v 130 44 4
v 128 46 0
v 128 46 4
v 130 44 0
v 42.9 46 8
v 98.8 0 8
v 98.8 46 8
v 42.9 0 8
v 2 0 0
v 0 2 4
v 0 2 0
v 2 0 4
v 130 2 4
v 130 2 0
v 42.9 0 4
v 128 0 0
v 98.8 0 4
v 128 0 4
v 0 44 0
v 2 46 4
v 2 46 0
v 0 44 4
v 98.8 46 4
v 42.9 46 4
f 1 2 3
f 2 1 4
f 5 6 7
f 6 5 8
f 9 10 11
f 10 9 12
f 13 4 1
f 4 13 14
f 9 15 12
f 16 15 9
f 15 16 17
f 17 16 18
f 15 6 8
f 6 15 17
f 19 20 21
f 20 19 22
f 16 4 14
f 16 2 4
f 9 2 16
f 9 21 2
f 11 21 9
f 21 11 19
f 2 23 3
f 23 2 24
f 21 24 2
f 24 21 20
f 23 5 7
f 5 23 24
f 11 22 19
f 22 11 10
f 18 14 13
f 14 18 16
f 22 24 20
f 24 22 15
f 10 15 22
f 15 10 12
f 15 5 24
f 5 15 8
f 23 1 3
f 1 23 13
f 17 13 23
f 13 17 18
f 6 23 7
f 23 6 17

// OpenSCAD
$fn = 32;

// ----------------------------------------------------------------------
// Stepped bar: centerstep, 130 x 46 x 8/4 mm
// ----------------------------------------------------------------------

// --- parameters (mm) ---
bar_l = 130;              // bar length, X
bar_w = 46;               // bar width, Y
plate_t = 8;              // thickness of the thick zone, Z
thin_t = 4;               // thickness of the thin zone
corner_c = 2;             // corner chamfer of the bar
step_cut = 4;             // material removed from the thin zone
thick_from = 42.9;        // start of the thick middle zone
thick_to = 98.8;          // end of the thick middle zone
depth_1 = 4;              // depth of cut 1 from the top face
depth_2 = 4;              // depth of cut 2 from the top face
fit_tol = 0.1;            // declared fit tolerance (prompt contract)
free_tol = 0.3;           // declared free tolerance (prompt contract)

profile = [[2, 0], [128, 0], [130, 2], [130, 44], [128, 46], [2, 46], [0, 44], [0, 2]];  // primary outline, 8 points, counter clockwise
void_1 = [[-1, -1], [42.9, -1], [42.9, 47], [-1, 47]];  // thin left end, 4 points
void_2 = [[98.8, -1], [131, -1], [131, 47], [98.8, 47]];  // thin right end, 4 points

// --- the one profile operation ---
difference() {
  linear_extrude(height = plate_t) polygon(points = profile);
  translate([0, 0, plate_t - depth_1])
    linear_extrude(height = depth_1 + 1) polygon(points = void_1);
  translate([0, 0, plate_t - depth_2])
    linear_extrude(height = depth_2 + 1) polygon(points = void_2);
}
